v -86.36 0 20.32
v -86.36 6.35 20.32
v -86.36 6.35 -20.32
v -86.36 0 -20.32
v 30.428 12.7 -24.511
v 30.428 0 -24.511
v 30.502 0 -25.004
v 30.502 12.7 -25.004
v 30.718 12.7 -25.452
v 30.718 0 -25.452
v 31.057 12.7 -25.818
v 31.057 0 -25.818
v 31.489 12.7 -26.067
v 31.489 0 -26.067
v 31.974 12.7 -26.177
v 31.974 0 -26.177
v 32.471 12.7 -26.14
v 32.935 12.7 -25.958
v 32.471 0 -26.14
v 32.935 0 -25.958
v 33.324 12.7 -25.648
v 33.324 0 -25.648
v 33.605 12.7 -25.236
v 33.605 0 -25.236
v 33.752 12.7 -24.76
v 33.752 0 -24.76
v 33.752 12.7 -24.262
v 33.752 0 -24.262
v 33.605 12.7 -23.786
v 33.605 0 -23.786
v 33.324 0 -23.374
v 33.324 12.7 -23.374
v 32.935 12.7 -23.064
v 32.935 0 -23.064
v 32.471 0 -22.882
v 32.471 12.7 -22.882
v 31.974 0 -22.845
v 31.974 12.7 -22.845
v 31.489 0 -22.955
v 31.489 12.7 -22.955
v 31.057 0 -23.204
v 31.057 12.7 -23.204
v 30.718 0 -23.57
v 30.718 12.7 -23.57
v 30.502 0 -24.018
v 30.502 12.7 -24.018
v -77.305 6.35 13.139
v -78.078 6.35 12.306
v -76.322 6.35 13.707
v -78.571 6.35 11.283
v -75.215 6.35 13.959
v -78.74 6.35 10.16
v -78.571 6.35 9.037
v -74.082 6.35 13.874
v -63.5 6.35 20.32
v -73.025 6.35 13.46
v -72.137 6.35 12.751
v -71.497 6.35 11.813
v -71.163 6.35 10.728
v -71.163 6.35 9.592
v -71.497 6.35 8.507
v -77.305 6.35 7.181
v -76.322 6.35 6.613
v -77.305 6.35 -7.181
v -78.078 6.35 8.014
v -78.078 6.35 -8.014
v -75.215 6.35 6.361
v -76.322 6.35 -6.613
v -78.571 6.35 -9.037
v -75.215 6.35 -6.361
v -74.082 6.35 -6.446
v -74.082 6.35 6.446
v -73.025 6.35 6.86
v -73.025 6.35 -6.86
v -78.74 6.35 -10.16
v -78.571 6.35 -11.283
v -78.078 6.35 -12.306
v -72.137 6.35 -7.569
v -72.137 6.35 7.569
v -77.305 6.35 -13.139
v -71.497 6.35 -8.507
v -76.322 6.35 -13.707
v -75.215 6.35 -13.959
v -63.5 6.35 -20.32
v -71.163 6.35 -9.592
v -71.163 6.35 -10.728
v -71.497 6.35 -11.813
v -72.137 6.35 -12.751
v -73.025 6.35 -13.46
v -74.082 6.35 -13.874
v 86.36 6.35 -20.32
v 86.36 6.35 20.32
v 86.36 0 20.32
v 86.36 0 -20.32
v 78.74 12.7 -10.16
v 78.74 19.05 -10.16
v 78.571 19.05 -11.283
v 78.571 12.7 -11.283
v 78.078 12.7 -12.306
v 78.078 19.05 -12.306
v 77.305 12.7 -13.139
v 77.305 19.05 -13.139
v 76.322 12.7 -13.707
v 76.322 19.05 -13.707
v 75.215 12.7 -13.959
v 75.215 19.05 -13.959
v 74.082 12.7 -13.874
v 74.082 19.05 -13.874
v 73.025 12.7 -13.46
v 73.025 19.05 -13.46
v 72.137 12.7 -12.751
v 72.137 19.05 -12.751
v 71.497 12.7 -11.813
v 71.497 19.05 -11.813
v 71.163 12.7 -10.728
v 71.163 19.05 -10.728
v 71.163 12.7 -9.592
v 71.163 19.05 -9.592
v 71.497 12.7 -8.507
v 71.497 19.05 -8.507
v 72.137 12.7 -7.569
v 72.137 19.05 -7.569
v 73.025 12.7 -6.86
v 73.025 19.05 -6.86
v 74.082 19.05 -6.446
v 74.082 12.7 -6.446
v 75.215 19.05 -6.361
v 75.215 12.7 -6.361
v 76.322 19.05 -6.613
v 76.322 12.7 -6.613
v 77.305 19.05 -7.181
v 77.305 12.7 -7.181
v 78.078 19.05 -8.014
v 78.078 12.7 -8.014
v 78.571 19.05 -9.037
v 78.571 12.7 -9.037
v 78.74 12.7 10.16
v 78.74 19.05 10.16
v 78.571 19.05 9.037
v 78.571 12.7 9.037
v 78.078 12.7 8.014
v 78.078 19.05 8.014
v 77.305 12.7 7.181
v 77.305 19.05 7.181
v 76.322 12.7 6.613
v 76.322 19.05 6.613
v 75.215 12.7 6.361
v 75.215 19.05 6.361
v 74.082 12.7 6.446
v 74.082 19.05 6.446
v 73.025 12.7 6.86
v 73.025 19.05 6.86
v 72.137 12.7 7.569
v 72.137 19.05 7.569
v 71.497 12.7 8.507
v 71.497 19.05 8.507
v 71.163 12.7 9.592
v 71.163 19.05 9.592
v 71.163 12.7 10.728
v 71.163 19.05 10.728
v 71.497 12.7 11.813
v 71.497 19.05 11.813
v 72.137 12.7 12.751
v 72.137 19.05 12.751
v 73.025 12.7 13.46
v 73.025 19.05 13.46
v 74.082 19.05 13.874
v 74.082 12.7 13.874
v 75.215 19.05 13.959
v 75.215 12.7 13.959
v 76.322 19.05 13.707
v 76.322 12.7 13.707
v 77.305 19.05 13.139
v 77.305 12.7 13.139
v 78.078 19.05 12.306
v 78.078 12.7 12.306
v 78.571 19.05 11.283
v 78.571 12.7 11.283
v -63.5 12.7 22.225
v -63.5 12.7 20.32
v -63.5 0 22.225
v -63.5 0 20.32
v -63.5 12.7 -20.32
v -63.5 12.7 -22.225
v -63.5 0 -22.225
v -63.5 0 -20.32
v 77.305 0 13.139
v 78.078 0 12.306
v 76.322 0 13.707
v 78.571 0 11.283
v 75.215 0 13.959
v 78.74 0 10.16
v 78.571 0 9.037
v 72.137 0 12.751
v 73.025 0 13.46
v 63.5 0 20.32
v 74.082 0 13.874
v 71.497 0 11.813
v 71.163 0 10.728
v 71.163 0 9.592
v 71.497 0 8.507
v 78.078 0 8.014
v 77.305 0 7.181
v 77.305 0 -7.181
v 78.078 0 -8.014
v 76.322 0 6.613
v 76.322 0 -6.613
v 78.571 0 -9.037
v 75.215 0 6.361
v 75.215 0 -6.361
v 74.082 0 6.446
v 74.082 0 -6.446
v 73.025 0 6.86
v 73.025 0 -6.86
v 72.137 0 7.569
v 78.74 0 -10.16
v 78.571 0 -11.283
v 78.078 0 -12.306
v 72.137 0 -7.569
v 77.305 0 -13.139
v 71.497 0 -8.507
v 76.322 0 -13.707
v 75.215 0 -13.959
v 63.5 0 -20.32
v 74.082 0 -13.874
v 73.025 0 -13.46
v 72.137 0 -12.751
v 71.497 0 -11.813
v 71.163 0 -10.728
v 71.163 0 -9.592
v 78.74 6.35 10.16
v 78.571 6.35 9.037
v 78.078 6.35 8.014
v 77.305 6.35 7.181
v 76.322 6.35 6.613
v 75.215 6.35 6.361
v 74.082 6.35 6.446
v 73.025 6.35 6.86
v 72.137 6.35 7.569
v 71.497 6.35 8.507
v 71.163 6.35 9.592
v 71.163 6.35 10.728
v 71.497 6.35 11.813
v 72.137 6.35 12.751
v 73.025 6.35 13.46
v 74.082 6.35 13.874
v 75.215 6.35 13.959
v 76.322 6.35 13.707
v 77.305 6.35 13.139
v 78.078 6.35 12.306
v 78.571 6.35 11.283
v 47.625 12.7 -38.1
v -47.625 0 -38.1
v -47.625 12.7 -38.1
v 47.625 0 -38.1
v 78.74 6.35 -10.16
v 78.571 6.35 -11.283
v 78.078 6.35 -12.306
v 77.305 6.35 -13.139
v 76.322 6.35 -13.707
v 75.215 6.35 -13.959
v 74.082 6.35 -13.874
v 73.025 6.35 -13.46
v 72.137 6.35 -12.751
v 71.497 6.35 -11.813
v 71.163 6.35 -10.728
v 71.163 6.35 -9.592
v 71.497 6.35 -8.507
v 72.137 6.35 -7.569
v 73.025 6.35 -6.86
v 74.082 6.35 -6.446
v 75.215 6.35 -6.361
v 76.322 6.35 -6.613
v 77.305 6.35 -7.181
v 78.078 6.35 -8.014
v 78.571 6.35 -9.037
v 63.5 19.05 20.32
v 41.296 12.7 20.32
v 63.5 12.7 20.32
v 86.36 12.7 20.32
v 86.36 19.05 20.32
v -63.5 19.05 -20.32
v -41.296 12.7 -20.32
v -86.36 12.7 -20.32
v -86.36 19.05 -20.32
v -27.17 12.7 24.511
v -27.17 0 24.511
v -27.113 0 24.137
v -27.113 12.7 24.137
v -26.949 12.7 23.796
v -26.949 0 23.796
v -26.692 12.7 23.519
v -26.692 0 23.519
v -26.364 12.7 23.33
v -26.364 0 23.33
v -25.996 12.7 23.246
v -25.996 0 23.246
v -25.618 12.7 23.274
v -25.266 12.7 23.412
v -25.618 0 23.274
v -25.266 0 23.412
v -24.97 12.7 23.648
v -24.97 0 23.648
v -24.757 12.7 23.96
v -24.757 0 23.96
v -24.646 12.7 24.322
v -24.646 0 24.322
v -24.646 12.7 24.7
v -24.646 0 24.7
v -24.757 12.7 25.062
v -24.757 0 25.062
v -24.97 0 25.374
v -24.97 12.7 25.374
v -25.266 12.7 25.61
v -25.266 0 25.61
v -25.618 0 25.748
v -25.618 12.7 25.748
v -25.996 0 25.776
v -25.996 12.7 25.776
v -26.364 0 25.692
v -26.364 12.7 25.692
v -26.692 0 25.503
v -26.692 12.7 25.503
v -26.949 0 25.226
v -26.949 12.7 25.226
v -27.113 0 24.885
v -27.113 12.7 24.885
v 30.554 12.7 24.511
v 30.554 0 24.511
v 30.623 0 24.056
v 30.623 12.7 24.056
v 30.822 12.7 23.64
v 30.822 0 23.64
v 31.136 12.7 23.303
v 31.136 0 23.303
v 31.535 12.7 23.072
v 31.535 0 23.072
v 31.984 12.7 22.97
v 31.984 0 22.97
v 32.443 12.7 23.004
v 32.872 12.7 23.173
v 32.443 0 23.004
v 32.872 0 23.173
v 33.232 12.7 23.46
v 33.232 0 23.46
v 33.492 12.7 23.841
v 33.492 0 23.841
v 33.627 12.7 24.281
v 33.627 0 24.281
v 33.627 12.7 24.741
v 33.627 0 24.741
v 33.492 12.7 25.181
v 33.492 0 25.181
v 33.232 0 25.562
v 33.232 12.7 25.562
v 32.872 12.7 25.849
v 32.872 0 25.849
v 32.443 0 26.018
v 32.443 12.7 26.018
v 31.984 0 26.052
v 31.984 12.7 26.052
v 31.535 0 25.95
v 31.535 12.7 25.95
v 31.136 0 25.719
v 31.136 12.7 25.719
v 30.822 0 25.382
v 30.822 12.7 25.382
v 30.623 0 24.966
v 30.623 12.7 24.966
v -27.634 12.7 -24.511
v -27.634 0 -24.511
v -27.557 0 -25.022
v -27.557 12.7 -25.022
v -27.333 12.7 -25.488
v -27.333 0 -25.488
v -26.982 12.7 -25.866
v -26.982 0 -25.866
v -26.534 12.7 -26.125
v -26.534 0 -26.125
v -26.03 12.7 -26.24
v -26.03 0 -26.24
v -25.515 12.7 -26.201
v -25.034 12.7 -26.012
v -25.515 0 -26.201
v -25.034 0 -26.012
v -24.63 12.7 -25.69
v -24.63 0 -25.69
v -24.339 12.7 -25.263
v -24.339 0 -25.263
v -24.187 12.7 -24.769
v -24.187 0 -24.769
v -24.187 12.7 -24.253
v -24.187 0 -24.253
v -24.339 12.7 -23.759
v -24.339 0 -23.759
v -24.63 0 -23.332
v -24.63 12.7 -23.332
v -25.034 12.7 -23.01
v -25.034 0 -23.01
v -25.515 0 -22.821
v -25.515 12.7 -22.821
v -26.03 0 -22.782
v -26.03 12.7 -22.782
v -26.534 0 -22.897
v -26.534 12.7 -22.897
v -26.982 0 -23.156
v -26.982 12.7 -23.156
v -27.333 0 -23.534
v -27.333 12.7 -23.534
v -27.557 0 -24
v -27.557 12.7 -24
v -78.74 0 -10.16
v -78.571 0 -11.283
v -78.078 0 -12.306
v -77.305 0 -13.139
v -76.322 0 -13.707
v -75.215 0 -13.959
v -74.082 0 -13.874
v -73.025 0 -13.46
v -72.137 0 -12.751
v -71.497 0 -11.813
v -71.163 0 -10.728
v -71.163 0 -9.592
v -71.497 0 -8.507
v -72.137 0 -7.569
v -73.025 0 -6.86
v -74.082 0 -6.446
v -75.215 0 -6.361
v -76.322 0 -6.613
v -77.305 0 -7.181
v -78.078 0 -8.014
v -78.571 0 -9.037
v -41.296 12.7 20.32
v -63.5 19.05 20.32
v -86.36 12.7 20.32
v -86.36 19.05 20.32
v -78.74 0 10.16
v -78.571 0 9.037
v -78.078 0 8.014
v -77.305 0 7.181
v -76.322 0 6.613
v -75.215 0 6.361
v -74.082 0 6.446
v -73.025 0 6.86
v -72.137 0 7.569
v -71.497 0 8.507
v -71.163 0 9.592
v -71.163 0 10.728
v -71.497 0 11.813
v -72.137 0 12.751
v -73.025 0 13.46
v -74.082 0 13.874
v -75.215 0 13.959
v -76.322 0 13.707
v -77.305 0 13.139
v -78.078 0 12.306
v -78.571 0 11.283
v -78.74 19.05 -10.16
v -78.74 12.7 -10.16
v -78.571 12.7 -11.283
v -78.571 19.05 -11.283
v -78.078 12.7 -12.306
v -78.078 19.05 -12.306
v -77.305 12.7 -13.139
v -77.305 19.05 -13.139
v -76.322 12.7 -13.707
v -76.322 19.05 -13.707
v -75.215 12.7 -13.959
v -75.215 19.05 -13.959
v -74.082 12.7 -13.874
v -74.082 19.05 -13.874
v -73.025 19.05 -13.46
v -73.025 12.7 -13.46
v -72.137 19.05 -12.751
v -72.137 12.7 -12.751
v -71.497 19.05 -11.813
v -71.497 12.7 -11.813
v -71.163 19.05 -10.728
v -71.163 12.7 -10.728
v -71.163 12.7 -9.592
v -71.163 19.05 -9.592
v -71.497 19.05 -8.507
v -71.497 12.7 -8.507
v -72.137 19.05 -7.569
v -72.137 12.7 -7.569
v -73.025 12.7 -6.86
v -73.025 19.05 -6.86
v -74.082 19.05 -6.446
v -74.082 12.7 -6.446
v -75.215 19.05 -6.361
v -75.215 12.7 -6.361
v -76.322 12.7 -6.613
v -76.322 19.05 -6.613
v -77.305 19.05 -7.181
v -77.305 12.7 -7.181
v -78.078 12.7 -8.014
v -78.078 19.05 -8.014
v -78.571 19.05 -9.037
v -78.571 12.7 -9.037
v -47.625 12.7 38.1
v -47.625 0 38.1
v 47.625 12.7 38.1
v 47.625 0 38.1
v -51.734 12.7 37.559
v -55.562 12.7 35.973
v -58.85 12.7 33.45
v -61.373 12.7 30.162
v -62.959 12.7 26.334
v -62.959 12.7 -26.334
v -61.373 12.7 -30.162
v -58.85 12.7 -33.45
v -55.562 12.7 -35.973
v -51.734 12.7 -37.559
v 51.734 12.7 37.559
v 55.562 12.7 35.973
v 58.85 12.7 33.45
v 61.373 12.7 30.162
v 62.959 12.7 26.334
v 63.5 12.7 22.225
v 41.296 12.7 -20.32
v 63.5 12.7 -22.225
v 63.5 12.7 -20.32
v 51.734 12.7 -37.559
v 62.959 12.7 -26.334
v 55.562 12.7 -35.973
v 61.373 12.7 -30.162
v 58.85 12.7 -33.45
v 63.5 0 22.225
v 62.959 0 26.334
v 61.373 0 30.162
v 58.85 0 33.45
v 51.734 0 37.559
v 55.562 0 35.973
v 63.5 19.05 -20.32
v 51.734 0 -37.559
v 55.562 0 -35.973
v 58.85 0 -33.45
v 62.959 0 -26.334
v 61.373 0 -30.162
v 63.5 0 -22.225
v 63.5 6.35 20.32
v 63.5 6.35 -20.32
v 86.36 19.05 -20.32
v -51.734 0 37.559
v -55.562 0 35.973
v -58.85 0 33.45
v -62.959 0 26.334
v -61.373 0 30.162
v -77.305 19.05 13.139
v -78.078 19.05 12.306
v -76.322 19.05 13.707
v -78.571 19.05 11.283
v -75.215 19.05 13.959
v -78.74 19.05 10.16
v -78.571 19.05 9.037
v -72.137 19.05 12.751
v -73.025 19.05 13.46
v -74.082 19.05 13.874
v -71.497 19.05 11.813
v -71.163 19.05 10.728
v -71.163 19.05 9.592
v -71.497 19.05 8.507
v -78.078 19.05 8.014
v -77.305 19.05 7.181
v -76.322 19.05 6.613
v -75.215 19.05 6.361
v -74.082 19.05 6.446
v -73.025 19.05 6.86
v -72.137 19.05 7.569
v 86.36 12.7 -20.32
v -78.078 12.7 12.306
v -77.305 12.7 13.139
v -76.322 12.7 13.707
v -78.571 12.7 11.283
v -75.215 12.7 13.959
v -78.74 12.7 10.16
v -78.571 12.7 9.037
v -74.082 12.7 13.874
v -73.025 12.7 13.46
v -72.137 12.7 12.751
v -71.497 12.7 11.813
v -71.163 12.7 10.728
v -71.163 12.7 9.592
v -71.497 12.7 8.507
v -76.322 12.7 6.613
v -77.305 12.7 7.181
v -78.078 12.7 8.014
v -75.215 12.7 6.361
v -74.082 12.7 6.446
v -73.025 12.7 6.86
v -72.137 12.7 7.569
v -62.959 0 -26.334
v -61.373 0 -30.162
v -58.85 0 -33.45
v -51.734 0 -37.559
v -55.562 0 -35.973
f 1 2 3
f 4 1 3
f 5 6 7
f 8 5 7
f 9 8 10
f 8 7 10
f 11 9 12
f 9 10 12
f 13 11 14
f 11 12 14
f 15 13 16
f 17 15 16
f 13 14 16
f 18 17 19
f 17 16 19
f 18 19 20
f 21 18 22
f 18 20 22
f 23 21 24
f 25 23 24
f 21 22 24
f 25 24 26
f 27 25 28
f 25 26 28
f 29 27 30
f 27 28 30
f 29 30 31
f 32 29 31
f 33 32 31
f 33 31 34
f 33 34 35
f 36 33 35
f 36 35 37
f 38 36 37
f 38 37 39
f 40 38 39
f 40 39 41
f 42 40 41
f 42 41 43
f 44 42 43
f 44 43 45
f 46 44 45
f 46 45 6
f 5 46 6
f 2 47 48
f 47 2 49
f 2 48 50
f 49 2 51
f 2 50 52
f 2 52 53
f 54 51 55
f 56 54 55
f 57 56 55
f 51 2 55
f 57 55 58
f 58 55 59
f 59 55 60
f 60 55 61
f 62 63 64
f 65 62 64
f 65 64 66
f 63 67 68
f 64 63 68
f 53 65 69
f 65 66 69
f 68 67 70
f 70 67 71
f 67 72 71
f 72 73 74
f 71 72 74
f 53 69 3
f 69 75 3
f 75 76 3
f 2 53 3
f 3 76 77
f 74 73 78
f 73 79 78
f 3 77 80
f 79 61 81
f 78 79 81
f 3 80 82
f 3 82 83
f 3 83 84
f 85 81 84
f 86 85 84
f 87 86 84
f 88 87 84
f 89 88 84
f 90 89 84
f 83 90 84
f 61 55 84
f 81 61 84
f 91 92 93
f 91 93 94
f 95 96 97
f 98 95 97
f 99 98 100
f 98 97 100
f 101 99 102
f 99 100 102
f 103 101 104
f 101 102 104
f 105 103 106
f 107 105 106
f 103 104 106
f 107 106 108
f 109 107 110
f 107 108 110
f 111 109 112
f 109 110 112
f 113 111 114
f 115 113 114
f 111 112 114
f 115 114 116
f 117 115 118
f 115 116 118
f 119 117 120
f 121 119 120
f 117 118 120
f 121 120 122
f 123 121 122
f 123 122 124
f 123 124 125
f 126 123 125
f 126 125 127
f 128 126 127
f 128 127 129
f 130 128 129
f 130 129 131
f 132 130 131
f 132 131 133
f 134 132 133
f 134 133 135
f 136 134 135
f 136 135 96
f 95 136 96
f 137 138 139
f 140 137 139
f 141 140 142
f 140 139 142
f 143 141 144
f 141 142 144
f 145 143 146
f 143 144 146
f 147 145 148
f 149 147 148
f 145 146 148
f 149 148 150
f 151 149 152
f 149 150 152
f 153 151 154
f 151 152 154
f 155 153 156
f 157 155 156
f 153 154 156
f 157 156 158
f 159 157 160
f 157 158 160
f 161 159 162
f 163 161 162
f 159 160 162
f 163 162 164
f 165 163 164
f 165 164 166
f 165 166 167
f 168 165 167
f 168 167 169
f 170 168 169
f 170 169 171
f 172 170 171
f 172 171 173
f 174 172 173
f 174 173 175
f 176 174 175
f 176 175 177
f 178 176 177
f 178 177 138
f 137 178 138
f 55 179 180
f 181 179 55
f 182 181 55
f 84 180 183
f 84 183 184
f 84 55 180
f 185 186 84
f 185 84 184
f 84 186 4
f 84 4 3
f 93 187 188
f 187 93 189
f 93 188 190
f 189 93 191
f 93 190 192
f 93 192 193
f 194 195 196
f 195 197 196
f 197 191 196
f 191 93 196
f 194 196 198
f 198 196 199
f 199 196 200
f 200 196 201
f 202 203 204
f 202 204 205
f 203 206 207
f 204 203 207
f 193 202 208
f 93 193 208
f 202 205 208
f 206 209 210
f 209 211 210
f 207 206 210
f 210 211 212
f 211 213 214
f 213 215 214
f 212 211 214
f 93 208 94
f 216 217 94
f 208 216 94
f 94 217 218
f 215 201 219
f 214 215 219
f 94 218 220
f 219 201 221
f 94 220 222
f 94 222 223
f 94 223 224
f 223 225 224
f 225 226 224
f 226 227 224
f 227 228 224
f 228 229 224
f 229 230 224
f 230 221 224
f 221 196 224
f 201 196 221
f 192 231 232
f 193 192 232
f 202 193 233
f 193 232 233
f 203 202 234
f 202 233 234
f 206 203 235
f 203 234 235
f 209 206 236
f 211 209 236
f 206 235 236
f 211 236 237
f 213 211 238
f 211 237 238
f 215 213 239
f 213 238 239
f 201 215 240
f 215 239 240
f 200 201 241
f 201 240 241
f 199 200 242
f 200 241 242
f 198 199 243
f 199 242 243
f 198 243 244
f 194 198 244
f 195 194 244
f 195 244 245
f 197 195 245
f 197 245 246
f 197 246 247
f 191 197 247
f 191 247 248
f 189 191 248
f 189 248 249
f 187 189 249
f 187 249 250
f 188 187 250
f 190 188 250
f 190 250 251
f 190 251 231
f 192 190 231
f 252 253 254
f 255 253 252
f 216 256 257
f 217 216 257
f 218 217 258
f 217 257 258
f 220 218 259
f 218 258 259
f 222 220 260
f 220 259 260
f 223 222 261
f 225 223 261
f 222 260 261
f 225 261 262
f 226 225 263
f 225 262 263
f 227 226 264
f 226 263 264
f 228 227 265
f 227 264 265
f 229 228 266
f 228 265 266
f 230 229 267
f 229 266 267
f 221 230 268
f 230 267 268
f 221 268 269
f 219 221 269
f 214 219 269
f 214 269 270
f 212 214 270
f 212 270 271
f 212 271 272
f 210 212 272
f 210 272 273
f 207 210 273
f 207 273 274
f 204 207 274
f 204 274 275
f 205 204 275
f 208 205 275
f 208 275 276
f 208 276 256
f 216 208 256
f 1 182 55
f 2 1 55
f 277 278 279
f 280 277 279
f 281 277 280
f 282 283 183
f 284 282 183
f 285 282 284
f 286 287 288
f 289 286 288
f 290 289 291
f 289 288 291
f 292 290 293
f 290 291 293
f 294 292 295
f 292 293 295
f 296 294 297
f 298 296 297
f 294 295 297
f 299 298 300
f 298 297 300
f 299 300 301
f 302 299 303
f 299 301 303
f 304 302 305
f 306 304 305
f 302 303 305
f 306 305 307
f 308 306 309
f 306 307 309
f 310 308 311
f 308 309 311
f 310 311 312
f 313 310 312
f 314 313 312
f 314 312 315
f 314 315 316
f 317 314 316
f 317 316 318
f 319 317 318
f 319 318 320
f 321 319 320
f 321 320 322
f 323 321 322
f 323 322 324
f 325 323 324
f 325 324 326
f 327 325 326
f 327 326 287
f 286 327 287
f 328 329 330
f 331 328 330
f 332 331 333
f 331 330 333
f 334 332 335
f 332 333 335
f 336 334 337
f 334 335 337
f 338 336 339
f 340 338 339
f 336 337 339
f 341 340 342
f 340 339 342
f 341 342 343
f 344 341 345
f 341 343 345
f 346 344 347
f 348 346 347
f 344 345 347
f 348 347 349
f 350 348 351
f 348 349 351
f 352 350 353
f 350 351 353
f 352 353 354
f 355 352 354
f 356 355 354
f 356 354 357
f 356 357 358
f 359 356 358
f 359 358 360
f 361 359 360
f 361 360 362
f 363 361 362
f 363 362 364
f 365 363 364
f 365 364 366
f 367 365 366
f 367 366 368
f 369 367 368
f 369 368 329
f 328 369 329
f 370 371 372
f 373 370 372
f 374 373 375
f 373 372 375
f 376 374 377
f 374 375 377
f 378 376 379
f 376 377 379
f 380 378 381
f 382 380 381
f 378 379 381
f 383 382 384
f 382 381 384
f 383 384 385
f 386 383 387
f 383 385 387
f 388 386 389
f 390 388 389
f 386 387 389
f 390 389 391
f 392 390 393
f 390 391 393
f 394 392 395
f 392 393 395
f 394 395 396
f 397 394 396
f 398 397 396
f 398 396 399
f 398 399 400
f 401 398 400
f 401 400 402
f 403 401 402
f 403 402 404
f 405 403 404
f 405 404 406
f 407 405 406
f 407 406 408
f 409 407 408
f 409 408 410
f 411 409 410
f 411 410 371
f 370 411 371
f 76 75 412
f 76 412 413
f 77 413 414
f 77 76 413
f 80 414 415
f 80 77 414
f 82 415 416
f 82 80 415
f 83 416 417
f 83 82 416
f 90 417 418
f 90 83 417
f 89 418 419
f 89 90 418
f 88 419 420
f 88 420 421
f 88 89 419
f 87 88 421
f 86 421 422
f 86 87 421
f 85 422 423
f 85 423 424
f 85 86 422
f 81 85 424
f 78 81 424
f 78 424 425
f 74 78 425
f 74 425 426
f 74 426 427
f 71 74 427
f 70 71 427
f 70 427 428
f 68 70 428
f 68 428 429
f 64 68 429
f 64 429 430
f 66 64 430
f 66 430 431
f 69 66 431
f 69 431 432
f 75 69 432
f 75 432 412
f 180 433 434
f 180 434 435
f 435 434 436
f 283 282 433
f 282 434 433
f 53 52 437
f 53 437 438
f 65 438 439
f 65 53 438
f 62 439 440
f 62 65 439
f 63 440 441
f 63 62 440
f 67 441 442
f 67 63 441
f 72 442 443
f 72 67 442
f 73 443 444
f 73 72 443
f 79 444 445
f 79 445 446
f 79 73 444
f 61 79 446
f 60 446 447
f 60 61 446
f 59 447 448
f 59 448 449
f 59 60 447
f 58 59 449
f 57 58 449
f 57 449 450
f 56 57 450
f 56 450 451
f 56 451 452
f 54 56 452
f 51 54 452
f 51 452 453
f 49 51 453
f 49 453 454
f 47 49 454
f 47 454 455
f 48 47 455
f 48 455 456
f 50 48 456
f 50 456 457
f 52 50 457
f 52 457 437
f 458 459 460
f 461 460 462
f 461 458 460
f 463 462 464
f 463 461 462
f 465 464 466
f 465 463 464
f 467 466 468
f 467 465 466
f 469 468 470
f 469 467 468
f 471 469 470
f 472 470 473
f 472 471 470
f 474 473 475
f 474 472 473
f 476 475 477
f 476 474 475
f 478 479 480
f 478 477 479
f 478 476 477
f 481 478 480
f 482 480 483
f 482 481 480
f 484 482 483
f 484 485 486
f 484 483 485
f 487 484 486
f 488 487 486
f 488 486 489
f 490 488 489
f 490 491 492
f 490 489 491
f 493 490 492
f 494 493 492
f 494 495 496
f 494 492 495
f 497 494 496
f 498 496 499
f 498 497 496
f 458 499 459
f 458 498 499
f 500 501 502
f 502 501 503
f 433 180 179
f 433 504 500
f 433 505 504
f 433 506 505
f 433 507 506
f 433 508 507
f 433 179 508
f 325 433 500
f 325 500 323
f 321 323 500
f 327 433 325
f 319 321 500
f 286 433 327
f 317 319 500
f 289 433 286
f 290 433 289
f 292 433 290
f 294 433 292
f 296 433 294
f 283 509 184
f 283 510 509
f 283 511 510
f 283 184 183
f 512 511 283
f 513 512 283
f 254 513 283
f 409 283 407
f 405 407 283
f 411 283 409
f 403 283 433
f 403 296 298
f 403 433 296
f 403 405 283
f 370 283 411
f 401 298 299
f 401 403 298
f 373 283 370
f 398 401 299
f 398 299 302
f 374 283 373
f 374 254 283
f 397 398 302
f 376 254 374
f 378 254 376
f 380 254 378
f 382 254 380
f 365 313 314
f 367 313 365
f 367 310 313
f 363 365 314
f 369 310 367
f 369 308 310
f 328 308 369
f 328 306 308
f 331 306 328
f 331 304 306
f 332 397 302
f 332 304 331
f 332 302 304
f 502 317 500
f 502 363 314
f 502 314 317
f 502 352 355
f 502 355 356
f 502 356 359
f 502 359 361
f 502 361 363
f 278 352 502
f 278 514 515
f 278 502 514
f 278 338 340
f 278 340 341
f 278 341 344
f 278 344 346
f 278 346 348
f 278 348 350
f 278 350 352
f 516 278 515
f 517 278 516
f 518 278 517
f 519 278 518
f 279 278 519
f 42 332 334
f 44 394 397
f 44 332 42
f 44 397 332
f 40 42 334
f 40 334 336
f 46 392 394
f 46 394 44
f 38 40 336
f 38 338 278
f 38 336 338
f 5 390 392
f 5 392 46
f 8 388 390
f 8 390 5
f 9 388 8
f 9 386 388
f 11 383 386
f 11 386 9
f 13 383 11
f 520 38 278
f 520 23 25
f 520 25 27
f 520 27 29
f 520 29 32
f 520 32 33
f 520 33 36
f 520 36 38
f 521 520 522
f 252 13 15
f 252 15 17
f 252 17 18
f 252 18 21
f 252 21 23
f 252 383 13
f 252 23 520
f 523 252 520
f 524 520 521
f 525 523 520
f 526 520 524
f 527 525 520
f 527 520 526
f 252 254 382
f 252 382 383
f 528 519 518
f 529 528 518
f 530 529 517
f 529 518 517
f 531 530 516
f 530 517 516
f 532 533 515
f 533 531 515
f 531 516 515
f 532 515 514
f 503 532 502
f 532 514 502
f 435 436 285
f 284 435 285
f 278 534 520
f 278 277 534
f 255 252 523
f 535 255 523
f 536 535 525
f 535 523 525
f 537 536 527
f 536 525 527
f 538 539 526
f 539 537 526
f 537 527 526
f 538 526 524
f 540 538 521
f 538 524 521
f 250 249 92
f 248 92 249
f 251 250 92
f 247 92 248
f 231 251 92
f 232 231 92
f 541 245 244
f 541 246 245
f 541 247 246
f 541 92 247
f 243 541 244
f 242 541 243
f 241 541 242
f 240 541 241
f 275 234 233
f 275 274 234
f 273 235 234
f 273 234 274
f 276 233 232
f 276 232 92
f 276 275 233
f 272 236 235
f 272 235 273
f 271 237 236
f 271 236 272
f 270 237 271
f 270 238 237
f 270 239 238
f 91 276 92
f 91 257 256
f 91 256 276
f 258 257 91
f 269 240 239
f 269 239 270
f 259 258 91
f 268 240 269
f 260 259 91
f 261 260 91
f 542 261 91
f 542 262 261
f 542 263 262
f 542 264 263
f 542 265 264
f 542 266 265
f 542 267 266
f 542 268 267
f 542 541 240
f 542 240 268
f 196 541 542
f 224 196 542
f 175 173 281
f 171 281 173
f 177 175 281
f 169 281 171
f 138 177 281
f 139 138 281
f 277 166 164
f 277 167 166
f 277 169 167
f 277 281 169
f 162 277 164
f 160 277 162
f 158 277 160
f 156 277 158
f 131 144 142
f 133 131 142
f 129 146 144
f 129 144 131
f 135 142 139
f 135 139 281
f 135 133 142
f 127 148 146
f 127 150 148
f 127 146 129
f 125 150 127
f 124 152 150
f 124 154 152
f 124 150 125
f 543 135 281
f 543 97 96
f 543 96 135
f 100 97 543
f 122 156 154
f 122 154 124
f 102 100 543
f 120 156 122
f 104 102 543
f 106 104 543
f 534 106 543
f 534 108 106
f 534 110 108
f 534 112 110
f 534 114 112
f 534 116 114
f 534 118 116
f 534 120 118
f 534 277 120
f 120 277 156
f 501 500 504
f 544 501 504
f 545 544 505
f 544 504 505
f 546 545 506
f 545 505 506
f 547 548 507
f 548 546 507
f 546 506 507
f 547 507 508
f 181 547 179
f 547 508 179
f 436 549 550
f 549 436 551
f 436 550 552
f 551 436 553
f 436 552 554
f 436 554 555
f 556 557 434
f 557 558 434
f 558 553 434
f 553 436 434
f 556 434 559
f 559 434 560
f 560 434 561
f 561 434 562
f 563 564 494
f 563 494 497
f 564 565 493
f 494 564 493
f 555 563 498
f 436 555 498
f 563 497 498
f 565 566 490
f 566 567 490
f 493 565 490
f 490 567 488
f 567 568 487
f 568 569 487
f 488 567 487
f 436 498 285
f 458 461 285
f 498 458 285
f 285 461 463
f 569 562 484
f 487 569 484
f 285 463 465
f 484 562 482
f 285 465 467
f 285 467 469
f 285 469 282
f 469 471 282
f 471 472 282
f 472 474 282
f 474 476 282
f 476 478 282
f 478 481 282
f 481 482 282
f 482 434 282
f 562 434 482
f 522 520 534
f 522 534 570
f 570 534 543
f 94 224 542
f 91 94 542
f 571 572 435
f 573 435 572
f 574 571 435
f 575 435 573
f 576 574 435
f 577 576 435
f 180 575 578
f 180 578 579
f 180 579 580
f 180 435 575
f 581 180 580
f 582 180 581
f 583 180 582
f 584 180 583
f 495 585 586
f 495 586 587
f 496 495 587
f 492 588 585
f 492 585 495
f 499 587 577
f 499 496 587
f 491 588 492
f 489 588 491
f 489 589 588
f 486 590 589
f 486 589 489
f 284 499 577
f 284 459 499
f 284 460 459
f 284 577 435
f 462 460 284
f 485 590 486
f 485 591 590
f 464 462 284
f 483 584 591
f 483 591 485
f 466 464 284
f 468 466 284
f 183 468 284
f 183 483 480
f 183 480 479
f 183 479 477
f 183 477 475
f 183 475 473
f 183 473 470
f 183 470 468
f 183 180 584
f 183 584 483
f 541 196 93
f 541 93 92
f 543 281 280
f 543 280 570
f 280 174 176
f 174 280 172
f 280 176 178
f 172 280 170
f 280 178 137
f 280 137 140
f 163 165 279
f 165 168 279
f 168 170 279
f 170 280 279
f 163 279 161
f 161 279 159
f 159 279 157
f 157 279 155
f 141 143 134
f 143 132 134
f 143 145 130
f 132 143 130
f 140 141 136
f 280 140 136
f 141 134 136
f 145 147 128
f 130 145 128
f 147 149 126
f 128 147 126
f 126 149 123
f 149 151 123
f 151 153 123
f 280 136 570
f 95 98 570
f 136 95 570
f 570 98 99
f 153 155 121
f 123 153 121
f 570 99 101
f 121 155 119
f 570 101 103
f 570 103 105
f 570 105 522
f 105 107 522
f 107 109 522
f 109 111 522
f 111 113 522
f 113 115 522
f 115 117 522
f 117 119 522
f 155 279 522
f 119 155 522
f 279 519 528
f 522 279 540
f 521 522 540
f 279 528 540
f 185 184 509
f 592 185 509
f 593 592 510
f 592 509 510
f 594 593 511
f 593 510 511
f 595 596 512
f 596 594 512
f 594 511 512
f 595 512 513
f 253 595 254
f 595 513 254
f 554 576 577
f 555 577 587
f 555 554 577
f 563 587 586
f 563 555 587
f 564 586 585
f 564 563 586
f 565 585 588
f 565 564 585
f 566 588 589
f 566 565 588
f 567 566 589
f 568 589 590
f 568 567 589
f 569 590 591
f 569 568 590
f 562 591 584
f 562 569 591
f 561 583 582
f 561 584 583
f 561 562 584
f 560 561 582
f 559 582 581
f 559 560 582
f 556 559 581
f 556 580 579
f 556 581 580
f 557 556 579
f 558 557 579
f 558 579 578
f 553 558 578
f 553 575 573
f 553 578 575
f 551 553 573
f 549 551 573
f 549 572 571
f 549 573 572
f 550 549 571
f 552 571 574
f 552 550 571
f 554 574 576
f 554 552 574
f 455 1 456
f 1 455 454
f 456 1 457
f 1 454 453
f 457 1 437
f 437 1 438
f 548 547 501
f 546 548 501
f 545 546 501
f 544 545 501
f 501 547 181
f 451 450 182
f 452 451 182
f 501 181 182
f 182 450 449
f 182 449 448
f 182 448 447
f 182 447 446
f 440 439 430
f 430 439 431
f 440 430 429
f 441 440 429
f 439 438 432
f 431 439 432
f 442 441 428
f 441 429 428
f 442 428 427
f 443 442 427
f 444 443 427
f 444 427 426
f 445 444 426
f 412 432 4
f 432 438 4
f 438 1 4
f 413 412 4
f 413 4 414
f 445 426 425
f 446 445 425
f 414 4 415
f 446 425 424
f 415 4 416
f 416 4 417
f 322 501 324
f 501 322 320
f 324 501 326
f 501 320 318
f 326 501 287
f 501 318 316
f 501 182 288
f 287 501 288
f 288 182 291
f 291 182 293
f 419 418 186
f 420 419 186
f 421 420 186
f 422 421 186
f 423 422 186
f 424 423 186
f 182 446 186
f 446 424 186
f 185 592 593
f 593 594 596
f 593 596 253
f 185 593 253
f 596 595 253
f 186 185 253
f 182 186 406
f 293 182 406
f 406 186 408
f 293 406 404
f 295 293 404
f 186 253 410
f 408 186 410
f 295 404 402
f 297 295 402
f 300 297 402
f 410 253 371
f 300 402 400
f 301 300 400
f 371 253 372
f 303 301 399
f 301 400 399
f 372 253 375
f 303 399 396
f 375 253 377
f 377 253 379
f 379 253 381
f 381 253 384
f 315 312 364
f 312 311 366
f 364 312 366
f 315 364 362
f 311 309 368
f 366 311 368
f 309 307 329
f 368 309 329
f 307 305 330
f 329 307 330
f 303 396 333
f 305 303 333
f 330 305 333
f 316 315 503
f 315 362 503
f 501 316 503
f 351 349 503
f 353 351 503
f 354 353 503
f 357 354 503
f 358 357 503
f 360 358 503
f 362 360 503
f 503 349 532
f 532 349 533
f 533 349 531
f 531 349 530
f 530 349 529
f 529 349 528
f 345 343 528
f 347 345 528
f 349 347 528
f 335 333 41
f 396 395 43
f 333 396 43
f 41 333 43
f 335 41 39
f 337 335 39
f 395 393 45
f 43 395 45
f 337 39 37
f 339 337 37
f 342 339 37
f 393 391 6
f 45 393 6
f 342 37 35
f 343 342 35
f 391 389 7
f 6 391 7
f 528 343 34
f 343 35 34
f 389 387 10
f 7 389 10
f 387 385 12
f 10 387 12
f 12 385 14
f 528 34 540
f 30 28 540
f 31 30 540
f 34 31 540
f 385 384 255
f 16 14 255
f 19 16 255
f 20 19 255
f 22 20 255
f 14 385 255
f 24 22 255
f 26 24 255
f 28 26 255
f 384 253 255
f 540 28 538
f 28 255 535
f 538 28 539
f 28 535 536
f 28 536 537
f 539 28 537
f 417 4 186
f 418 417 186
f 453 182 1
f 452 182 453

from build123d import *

# Parameters (mm, degrees)
SKETCH1_W             = 127
SKETCH1_H             = 76.2
BOSS_EXTRUDE1_DEPTH   = 12.7
SKETCH20_W            = 40.64
SKETCH20_H            = 6.35
BOSS_EXTRUDE7_DEPTH   = 22.86
BOSS_EXTRUDE7_2_DEPTH = 22.86
SKETCH21_R            = 3.81
CUT_EXTRUDE17_DEPTH   = 19.05
BOSS_EXTRUDE8_DEPTH   = 20.32
SKETCH19_R            = 1.671154259
SKETCH19_R_2          = 1.733603543
SKETCH19_R_3          = 1.269040072
SKETCH19_R_4          = 1.545344409
CUT_EXTRUDE18_DEPTH   = 42.672
CUT_EXTRUDE19_DEPTH   = 42.672


with BuildPart() as part:
    # Sketch1 → Boss-Extrude1 (new body)
    with BuildSketch(Plane(origin=(0, 0, 0), x_dir=(1, 0, 0), z_dir=(0, 1, 0))):
        Rectangle(SKETCH1_W, SKETCH1_H)
    extrude(amount=BOSS_EXTRUDE1_DEPTH)



with BuildPart() as body_2:
    # Sketch20 → Boss-Extrude7 (new body)
    with BuildSketch(Plane(origin=(63.5, 0, 0), x_dir=(0, 0, -1), z_dir=(1, 0, 0))):
        with Locations((0, 3.175)):
            Rectangle(SKETCH20_W, SKETCH20_H)
    boss_extrude7 = extrude(amount=BOSS_EXTRUDE7_DEPTH)


with BuildPart() as body_3:
    # Sketch20 → Boss-Extrude7 2 (new body)
    with BuildSketch(Plane(origin=(63.5, 0, 0), x_dir=(0, 0, -1), z_dir=(1, 0, 0))):
        with Locations((0, 15.875)):
            Rectangle(SKETCH20_W, SKETCH20_H)
    boss_extrude7_2 = extrude(amount=BOSS_EXTRUDE7_2_DEPTH)


with BuildPart() as cut_extrude17_tool:
    # Sketch21 → Cut-Extrude17 (new body)
    with BuildSketch(Plane(origin=(0, 19.05, 0), x_dir=(1, 0, 0), z_dir=(0, 1, 0))):
        with Locations((74.93, 10.16)):
            Circle(SKETCH21_R)
        with Locations((74.93, -10.16)):
            Circle(SKETCH21_R)
    cut_extrude17 = extrude(amount=-CUT_EXTRUDE17_DEPTH)


with BuildPart() as body_2_1:
    add(body_2.part)

    # Cut-Extrude17: cut by cut_extrude17_tool
    add(cut_extrude17_tool.part, mode=Mode.SUBTRACT)


with BuildPart() as body_3_1:
    add(body_3.part)

    # Cut-Extrude17: cut by cut_extrude17_tool
    add(cut_extrude17_tool.part, mode=Mode.SUBTRACT)


with BuildPart() as part_1:
    add(part.part)

    add(body_3_1.part)  # Boss-Extrude8 merges body 3
    # Sketch24 → Boss-Extrude8 (add, symmetric)
    with BuildSketch(Plane.XY):
        Polygon((63.5, 19.05), (41.29642666, 12.7), (63.5, 12.7), align=None)
    boss_extrude8 = extrude(amount=BOSS_EXTRUDE8_DEPTH, both=True)

    # Sketch19 → Cut-Extrude18 (cut)
    with BuildSketch(Plane(origin=(0, 0, 0), x_dir=(-1, 0, 0), z_dir=(0, -1, 0))):
        with Locations((-32.09925, 24.511)):
            Circle(SKETCH19_R)
        with Locations((25.90074068, 24.511)):
            Circle(SKETCH19_R_2)
        with Locations((25.90074068, -24.511)):
            Circle(SKETCH19_R_3)
        with Locations((-32.09925, -24.511)):
            Circle(SKETCH19_R_4)
    extrude(amount=-CUT_EXTRUDE18_DEPTH, mode=Mode.SUBTRACT)

    # Sketch12 → Cut-Extrude19 (cut)
    with BuildSketch(Plane(origin=(0, 12.7, 0), x_dir=(1, 0, 0), z_dir=(0, 1, 0))):
        with BuildLine():
            ThreePointArc((-47.625, -38.1), (-58.850320151, -33.450320151), (-63.5, -22.225))
            Line((-63.5, -22.225), (-63.5, -38.1))
            Line((-63.5, -38.1), (-47.625, -38.1))
        make_face()
        with BuildLine():
            ThreePointArc((-63.5, 22.225), (-58.850320151, 33.450320151), (-47.625, 38.1))
            Line((-47.625, 38.1), (-63.5, 38.1))
            Line((-63.5, 38.1), (-63.5, 22.225))
        make_face()
        with BuildLine():
            Line((63.5, 38.1), (47.625, 38.1))
            ThreePointArc((47.625, 38.1), (58.850320151, 33.450320151), (63.5, 22.225))
            Line((63.5, 22.225), (63.5, 38.1))
        make_face()
        with BuildLine():
            Line((63.5, -38.1), (63.5, -22.225))
            ThreePointArc((63.5, -22.225), (58.850320151, -33.450320151), (47.625, -38.1))
            Line((47.625, -38.1), (63.5, -38.1))
        make_face()
    extrude(amount=-CUT_EXTRUDE19_DEPTH, mode=Mode.SUBTRACT)

    # Mirror1: Boss-Extrude7, Boss-Extrude7 2, Cut-Extrude17, Boss-Extrude8 across plane
    add(boss_extrude7.mirror(Plane(origin=(0, 0, 0), x_dir=(0, 0, 1), z_dir=(1, 0, 0))))
    add(boss_extrude7_2.mirror(Plane(origin=(0, 0, 0), x_dir=(0, 0, 1), z_dir=(1, 0, 0))))
    add(cut_extrude17.mirror(Plane(origin=(0, 0, 0), x_dir=(0, 0, 1), z_dir=(1, 0, 0))), mode=Mode.SUBTRACT)
    add(boss_extrude8.mirror(Plane(origin=(0, 0, 0), x_dir=(0, 0, 1), z_dir=(1, 0, 0))))


solid = Compound([body_2_1.part, part_1.part])
